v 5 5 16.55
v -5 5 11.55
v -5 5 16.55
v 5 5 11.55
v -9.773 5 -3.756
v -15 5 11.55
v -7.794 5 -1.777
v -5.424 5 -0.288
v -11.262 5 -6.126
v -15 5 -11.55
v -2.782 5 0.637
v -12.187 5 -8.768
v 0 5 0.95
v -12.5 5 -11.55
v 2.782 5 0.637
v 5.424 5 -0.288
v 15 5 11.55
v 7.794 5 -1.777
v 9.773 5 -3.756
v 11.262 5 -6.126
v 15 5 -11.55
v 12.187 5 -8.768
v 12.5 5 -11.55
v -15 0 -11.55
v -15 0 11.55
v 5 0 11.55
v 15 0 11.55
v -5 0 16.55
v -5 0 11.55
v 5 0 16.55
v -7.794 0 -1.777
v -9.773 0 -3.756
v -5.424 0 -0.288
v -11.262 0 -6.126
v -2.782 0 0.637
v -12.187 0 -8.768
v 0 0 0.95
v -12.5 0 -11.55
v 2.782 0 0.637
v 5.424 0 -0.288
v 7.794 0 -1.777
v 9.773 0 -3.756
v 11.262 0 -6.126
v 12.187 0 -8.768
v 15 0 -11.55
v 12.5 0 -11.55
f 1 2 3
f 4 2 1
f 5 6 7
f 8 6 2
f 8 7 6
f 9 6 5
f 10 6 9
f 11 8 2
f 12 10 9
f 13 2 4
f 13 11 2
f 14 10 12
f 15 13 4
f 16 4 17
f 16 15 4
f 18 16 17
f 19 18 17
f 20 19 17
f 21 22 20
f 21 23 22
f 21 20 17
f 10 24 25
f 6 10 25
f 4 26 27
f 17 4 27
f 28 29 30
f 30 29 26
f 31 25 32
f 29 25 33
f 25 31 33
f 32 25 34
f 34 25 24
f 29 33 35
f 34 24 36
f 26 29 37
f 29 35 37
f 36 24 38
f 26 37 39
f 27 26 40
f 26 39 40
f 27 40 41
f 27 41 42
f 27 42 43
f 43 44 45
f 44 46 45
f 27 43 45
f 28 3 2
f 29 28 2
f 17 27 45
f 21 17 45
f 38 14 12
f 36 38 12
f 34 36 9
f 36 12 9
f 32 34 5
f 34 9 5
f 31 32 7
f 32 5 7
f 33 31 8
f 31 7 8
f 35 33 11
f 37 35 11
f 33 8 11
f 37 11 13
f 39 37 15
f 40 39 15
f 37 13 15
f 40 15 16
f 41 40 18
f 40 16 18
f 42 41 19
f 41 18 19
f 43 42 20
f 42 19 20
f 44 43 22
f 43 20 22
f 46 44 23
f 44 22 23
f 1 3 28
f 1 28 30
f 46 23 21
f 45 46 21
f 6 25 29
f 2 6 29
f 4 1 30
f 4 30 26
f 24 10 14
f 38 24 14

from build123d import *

# Parameters (mm, degrees)
EXTRUDE_1_DEPTH     = 5
SKETCH_2_R          = 12.5
SKETCH_2_R_2        = 1.5
SKETCH_2_R_3        = 4
EXTRUDE_2_DEPTH     = 5
SKETCH_3_W          = 10
SKETCH_3_H          = 5
EXTRUDE_3_DEPTH     = 5
CUT_EXTRUDE_1_DEPTH = 10


with BuildPart() as part:
    # 草图1 → 凸台-拉伸1 (new body)
    with BuildSketch(Plane(origin=(0, 0, 0), x_dir=(1, 0, 0), z_dir=(0, 1, 0))):
        with BuildLine():
            ThreePointArc((15, 11.55), (0, 26.55), (-15, 11.55))
            Line((-15, 11.55), (-12.5, 11.55))
            ThreePointArc((-12.5, 11.55), (0, 24.05), (12.5, 11.55))
            Line((12.5, 11.55), (15, 11.55))
        make_face()
        with BuildLine():
            Line((-12.5, 11.55), (-15, 11.55))
            ThreePointArc((-15, 11.55), (0, -3.45), (15, 11.55))
            Line((15, 11.55), (12.5, 11.55))
            ThreePointArc((12.5, 11.55), (0, -0.95), (-12.5, 11.55))
        make_face()
        with BuildLine():
            ThreePointArc((15, 11.55), (0, 26.55), (-15, 11.55))
            Line((-15, 11.55), (-12.5, 11.55))
            ThreePointArc((-12.5, 11.55), (0, 24.05), (12.5, 11.55))
            Line((12.5, 11.55), (15, 11.55))
        make_face()
        with BuildLine():
            Line((-12.5, 11.55), (-15, 11.55))
            ThreePointArc((-15, 11.55), (0, -3.45), (15, 11.55))
            Line((15, 11.55), (12.5, 11.55))
            ThreePointArc((12.5, 11.55), (0, -0.95), (-12.5, 11.55))
        make_face()
        with BuildLine():
            Line((-15, 11.55), (-15, -11.55))
            Line((-15, -11.55), (15, -11.55))
            Line((15, -11.55), (15, 11.55))
            ThreePointArc((15, 11.55), (0, -3.45), (-15, 11.55))
        make_face()
    extrude(amount=EXTRUDE_1_DEPTH)

    # 草图2 → 凸台-拉伸2 (add)
    with BuildSketch(Plane(origin=(0, 5, 0), x_dir=(1, 0, 0), z_dir=(0, 1, 0))):
        with Locations((0, 11.55)):
            Circle(SKETCH_2_R)
        with Locations((-8.5, 11.55)):
            Circle(SKETCH_2_R_2, mode=Mode.SUBTRACT)
        with Locations((8.5, 11.55)):
            Circle(SKETCH_2_R_2, mode=Mode.SUBTRACT)
        with Locations((0, 11.55)):
            Circle(SKETCH_2_R_3, mode=Mode.SUBTRACT)
    extrude(amount=-EXTRUDE_2_DEPTH)

    # 草图3 → 凸台-拉伸3 (add)
    with BuildSketch(Plane(origin=(0, 5, 0), x_dir=(1, 0, 0), z_dir=(0, 1, 0))):
        with Locations((0, -14.05)):
            Rectangle(SKETCH_3_W, SKETCH_3_H)
    extrude(amount=-EXTRUDE_3_DEPTH)

    # 草图4 → 切除-拉伸1 (cut)
    with BuildSketch(Plane(origin=(0, 5, 0), x_dir=(1, 0, 0), z_dir=(0, 1, 0))):
        with BuildLine():
            ThreePointArc((15, 11.55), (0, 26.55), (-15, 11.55))
            Line((-15, 11.55), (-12.5, 11.55))
            ThreePointArc((-12.5, 11.55), (0, 24.05), (12.5, 11.55))
            Line((12.5, 11.55), (15, 11.55))
        make_face()
        with BuildLine():
            ThreePointArc((12.5, 11.55), (0, 24.05), (-12.5, 11.55))
            Line((-12.5, 11.55), (-10, 11.55))
            ThreePointArc((-10, 11.55), (-8.5, 13.05), (-7, 11.55))
            Line((-7, 11.55), (-4, 11.55))
            ThreePointArc((-4, 11.55), (0, 15.55), (4, 11.55))
            Line((4, 11.55), (7, 11.55))
            ThreePointArc((7, 11.55), (8.5, 13.05), (10, 11.55))
            Line((10, 11.55), (12.5, 11.55))
        make_face()
        with BuildLine():
            Line((-10, 11.55), (-12.5, 11.55))
            ThreePointArc((-12.5, 11.55), (0, -0.95), (12.5, 11.55))
            Line((12.5, 11.55), (10, 11.55))
            ThreePointArc((10, 11.55), (8.5, 10.05), (7, 11.55))
            Line((7, 11.55), (4, 11.55))
            ThreePointArc((4, 11.55), (0, 7.55), (-4, 11.55))
            Line((-4, 11.55), (-7, 11.55))
            ThreePointArc((-7, 11.55), (-8.5, 10.05), (-10, 11.55))
        make_face()
        with BuildLine():
            ThreePointArc((12.5, 11.55), (0, 24.05), (-12.5, 11.55))
            Line((-12.5, 11.55), (-10, 11.55))
            ThreePointArc((-10, 11.55), (-8.5, 13.05), (-7, 11.55))
            Line((-7, 11.55), (-4, 11.55))
            ThreePointArc((-4, 11.55), (0, 15.55), (4, 11.55))
            Line((4, 11.55), (7, 11.55))
            ThreePointArc((7, 11.55), (8.5, 13.05), (10, 11.55))
            Line((10, 11.55), (12.5, 11.55))
        make_face()
        with BuildLine():
            Line((-10, 11.55), (-12.5, 11.55))
            ThreePointArc((-12.5, 11.55), (0, -0.95), (12.5, 11.55))
            Line((12.5, 11.55), (10, 11.55))
            ThreePointArc((10, 11.55), (8.5, 10.05), (7, 11.55))
            Line((7, 11.55), (4, 11.55))
            ThreePointArc((4, 11.55), (0, 7.55), (-4, 11.55))
            Line((-4, 11.55), (-7, 11.55))
            ThreePointArc((-7, 11.55), (-8.5, 10.05), (-10, 11.55))
        make_face()
    extrude(amount=-CUT_EXTRUDE_1_DEPTH, mode=Mode.SUBTRACT)


solid = part.part
